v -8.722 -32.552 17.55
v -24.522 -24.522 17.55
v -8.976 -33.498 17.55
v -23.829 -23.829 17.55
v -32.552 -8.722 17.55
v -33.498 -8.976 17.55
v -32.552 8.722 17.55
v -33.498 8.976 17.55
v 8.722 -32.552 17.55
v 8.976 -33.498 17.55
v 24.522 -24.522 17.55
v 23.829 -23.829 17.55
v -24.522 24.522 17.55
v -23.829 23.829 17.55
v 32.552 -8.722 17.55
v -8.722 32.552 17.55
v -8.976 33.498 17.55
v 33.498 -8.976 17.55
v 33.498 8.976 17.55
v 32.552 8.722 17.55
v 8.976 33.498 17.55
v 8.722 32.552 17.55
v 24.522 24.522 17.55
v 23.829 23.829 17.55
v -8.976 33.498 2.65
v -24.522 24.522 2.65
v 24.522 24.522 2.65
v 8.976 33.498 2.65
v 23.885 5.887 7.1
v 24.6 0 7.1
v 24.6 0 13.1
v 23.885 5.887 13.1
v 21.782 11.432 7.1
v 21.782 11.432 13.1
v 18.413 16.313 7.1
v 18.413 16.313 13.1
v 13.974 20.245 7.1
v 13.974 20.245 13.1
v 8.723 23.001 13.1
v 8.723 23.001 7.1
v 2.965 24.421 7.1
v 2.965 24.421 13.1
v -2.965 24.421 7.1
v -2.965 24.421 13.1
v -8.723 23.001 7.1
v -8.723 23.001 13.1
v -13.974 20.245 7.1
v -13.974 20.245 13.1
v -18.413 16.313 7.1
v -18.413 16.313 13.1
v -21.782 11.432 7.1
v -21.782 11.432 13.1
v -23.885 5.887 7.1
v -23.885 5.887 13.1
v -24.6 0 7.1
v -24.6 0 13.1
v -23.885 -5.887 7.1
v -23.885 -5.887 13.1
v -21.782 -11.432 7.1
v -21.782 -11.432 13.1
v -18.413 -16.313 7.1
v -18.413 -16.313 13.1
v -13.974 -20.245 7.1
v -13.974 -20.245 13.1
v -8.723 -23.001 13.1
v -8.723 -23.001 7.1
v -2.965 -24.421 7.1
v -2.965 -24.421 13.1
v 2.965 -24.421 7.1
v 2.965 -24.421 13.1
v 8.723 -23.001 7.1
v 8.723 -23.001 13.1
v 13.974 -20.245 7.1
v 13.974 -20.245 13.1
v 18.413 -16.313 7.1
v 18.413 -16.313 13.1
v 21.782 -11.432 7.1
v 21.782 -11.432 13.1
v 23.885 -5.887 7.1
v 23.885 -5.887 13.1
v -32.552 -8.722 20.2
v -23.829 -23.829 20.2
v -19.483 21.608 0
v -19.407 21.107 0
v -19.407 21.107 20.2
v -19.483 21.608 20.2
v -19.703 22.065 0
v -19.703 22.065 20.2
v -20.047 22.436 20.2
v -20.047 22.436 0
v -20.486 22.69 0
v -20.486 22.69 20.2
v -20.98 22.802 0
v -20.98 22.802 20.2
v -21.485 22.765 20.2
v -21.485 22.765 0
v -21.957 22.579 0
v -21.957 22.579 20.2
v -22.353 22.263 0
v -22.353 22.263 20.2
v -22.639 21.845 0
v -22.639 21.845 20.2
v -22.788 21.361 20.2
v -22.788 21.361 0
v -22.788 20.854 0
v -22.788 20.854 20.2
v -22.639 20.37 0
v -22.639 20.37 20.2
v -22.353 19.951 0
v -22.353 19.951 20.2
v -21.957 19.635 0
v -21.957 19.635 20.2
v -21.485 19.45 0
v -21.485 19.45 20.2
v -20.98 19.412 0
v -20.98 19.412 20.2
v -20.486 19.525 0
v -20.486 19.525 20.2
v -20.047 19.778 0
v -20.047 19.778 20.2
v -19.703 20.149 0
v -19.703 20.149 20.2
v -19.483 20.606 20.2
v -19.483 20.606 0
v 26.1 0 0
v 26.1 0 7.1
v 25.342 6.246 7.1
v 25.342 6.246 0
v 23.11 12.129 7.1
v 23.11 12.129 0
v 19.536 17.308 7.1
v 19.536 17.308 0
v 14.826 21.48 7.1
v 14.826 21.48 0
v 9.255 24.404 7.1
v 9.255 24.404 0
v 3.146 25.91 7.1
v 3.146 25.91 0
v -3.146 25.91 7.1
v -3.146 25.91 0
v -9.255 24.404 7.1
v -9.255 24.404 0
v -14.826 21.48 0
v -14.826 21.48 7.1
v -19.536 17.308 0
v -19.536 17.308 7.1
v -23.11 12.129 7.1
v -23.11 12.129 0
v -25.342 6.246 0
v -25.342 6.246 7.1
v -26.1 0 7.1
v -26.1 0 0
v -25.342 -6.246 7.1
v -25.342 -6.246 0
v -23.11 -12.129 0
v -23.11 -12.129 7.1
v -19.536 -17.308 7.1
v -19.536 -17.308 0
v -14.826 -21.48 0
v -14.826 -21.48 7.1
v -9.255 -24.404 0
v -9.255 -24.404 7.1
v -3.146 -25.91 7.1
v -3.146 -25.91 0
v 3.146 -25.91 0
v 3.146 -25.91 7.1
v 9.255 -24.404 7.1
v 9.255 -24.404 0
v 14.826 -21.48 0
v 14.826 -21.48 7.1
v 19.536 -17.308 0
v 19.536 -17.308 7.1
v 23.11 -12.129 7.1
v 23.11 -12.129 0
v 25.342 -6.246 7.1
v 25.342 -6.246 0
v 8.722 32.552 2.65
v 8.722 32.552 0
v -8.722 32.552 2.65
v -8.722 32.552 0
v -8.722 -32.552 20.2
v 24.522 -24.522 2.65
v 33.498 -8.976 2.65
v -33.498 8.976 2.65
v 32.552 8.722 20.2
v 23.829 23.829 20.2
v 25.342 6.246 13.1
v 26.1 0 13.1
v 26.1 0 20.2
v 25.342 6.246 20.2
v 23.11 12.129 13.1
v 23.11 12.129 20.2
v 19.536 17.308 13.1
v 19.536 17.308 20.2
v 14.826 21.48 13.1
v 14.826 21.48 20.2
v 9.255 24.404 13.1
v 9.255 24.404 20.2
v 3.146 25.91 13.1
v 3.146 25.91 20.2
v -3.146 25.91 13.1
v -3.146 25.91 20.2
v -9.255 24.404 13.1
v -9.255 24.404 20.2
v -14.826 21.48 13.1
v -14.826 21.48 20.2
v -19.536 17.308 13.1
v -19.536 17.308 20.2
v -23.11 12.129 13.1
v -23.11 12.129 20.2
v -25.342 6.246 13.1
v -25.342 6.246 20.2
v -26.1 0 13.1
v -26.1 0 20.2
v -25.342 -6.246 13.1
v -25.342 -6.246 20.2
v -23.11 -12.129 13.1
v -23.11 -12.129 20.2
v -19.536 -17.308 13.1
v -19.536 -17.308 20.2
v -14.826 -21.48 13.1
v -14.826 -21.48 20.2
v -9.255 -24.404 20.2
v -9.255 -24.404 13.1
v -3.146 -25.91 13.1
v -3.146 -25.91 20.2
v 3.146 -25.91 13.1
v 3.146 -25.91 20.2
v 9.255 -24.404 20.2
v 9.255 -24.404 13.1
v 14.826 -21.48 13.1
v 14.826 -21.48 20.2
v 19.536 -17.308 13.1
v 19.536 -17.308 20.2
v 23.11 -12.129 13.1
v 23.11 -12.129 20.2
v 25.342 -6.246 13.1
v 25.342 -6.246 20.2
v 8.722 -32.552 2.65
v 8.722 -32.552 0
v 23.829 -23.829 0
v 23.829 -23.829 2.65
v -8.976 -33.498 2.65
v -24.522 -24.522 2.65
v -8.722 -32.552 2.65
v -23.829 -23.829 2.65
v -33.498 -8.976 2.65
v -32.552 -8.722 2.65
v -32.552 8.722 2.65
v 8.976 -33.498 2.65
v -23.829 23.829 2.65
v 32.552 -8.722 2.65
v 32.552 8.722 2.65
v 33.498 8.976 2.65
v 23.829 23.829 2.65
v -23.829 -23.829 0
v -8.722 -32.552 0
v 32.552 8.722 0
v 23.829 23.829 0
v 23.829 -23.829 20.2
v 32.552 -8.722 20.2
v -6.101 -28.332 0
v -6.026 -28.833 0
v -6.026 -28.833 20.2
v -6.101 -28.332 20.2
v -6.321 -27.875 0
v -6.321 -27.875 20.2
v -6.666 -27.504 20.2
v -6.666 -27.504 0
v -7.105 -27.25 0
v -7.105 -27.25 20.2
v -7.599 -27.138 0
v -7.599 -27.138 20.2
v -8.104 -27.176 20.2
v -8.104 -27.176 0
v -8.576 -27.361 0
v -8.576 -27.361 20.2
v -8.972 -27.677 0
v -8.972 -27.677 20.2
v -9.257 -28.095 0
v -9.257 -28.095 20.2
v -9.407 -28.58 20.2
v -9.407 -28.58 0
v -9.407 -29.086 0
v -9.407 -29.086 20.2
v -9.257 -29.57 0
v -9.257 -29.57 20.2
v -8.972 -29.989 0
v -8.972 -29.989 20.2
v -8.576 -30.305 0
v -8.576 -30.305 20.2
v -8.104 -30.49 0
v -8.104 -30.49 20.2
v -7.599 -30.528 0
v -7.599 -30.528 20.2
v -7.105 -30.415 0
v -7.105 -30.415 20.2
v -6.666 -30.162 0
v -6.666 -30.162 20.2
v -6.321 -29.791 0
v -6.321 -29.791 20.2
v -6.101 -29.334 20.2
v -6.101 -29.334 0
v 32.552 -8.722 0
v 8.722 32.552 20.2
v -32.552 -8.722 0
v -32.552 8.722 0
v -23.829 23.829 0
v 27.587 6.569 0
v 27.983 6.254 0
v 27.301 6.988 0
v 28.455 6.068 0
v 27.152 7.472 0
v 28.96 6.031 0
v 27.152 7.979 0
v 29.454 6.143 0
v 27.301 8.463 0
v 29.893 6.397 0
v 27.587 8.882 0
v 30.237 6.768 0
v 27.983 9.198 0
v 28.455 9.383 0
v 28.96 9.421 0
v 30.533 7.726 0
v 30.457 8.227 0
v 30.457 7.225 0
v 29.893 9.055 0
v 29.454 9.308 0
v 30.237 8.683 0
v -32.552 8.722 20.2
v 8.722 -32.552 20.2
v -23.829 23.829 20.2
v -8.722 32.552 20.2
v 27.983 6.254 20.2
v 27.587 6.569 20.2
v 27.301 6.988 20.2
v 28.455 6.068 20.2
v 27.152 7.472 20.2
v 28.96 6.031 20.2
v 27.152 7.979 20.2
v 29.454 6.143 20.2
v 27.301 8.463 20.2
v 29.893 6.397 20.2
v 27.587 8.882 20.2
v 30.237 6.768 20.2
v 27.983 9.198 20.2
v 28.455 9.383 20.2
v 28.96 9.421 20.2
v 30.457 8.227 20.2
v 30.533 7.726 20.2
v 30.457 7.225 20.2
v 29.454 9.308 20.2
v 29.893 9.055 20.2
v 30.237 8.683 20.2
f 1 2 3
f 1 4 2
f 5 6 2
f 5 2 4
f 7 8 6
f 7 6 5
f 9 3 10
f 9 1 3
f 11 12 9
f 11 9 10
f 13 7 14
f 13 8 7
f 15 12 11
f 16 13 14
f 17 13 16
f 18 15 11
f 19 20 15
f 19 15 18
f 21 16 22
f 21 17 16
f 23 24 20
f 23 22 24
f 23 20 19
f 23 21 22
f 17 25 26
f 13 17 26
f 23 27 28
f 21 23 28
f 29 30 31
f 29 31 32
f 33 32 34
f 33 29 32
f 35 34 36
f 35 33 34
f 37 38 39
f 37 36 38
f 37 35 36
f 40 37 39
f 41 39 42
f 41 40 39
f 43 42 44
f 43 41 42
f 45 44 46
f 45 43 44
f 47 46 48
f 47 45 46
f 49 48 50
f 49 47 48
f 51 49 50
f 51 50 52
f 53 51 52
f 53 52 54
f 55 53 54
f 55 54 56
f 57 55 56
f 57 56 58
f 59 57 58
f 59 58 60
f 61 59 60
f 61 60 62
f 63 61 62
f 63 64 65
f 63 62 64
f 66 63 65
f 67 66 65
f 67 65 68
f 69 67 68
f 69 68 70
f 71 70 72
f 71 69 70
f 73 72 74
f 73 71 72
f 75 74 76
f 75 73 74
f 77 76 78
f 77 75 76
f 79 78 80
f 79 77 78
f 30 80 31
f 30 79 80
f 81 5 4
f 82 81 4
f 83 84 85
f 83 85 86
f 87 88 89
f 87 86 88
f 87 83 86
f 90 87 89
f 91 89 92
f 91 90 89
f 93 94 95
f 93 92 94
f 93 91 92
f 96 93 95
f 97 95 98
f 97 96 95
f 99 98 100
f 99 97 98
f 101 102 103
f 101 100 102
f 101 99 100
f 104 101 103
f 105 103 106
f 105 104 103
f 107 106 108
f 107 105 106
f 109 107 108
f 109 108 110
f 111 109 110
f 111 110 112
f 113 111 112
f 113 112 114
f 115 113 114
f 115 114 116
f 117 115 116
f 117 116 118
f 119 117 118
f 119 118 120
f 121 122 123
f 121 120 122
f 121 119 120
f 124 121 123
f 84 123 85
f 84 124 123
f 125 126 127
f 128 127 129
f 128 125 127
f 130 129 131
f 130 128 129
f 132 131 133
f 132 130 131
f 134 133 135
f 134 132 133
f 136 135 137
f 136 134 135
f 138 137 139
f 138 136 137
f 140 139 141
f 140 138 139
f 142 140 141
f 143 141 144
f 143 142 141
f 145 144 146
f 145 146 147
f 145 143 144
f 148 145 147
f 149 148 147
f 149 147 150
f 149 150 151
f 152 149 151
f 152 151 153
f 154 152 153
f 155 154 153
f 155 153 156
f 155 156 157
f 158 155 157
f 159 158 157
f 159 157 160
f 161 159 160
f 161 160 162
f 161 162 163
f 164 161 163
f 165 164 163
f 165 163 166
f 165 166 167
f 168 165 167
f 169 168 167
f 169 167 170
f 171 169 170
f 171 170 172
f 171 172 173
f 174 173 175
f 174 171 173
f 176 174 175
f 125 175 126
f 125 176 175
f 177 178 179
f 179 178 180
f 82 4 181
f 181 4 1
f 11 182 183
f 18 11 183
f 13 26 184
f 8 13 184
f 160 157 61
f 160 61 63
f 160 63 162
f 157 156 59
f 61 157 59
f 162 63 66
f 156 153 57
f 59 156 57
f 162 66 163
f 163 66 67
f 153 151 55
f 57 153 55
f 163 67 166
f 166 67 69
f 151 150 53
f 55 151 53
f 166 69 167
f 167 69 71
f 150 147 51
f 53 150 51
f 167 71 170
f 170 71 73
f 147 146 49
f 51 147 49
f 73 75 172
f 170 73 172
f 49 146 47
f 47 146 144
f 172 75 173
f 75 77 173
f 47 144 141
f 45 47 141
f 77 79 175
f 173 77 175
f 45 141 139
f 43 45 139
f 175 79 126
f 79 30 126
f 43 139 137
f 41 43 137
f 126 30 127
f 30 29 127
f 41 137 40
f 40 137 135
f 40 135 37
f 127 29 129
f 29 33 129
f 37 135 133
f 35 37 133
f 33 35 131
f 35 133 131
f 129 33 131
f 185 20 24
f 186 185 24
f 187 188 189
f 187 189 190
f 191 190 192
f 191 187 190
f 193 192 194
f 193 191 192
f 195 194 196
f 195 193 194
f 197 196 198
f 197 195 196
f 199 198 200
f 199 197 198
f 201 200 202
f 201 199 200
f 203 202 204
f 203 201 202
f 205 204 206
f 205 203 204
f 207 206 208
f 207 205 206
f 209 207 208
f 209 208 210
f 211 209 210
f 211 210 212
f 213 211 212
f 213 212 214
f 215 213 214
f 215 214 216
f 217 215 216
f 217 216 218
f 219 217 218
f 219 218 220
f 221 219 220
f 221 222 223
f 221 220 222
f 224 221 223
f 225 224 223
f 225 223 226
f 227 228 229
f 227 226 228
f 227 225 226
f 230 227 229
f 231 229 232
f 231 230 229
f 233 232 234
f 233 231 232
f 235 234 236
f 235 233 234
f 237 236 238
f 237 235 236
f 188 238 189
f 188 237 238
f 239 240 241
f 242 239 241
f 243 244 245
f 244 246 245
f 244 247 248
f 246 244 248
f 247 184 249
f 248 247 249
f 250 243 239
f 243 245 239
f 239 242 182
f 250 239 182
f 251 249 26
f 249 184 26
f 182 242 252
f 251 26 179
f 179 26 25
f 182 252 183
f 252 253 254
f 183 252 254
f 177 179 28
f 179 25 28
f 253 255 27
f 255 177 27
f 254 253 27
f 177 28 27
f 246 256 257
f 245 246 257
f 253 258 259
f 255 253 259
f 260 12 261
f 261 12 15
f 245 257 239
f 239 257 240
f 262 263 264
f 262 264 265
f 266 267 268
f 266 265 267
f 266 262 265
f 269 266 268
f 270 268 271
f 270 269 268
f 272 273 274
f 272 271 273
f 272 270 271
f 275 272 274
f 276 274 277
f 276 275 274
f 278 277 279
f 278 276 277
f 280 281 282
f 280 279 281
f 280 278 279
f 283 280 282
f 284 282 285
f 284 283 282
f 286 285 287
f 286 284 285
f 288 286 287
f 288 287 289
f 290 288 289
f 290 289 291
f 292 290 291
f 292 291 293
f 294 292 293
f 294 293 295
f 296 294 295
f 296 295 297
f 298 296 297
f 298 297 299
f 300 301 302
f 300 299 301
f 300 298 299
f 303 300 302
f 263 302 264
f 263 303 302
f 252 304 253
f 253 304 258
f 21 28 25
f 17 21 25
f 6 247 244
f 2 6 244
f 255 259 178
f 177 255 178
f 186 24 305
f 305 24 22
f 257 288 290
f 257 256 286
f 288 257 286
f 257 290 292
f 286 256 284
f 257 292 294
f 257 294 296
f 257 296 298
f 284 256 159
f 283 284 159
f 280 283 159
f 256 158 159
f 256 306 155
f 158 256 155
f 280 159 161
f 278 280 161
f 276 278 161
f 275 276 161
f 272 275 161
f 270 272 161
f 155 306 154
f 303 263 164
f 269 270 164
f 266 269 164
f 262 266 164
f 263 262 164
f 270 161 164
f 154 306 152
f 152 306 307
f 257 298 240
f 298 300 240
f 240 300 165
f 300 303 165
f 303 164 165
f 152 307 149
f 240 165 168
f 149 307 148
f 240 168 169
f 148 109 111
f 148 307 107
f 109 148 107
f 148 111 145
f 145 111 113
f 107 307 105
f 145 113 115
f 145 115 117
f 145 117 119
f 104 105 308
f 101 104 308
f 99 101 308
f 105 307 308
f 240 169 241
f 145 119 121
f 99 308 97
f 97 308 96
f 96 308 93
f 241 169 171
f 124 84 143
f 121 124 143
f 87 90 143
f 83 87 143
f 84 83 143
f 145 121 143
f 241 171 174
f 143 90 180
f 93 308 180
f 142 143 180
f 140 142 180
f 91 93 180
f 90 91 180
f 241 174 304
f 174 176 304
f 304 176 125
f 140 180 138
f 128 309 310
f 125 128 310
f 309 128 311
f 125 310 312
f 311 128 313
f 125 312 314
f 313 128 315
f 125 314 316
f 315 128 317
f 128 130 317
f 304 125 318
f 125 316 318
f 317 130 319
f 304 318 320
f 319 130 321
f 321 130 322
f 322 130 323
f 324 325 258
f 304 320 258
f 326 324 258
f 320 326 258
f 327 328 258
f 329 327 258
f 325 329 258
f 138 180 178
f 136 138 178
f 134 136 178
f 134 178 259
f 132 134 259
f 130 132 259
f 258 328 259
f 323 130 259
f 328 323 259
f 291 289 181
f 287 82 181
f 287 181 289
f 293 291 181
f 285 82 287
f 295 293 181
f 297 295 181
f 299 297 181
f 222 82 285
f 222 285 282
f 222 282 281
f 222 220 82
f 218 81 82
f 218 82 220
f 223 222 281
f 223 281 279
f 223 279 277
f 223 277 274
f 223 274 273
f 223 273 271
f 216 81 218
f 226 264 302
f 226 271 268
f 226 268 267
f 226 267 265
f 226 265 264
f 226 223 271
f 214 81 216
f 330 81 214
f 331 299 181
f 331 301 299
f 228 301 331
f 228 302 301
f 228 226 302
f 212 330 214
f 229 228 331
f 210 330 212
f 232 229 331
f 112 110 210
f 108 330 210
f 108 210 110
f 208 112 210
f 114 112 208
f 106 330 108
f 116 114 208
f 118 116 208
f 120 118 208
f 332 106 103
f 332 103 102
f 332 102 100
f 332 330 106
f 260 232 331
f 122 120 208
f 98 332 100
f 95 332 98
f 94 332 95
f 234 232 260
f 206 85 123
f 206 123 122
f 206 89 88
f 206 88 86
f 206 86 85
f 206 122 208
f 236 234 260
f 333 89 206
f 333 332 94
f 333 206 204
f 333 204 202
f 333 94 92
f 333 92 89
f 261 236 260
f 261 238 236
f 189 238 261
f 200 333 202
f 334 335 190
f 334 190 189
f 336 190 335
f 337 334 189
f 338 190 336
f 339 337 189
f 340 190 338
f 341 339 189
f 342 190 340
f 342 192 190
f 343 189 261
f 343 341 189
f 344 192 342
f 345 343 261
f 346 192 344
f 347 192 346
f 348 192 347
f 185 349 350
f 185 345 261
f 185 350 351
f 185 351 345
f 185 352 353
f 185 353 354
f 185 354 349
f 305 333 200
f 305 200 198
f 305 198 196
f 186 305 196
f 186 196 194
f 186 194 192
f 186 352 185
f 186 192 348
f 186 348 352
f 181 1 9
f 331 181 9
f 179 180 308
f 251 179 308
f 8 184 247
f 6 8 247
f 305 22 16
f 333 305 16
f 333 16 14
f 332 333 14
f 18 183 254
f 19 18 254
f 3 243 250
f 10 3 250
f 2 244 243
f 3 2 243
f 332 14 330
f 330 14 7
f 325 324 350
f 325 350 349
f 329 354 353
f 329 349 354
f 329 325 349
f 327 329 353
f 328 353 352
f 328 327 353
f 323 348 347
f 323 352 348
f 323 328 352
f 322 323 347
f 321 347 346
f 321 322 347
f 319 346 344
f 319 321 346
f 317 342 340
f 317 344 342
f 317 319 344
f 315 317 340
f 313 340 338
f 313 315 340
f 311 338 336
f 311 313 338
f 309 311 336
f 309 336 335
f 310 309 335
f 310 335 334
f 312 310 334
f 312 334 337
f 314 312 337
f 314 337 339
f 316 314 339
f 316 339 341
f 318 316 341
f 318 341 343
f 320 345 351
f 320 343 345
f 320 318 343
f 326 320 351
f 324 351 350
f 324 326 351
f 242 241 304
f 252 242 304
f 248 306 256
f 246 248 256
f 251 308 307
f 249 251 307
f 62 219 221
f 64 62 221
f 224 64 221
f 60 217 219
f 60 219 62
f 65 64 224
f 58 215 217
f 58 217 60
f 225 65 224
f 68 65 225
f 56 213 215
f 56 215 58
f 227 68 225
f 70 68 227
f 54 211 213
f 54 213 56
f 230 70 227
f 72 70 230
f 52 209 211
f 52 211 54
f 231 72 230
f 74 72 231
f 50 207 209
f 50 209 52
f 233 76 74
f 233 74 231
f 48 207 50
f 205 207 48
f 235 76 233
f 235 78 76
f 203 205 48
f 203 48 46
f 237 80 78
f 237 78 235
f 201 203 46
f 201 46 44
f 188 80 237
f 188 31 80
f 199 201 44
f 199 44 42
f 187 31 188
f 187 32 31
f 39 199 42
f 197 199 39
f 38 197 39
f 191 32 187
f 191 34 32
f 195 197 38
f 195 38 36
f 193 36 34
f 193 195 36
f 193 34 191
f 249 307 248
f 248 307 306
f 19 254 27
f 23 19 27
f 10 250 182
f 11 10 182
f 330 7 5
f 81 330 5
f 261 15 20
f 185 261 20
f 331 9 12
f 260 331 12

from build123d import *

# Parameters (mm, degrees)
S01_SMALLER_TWELVE_FLAT_END_BEAD_SEATS_R      = 24.6
F_01_SMALLER_TWELVE_FLAT_END_BEAD_SEATS_DEPTH = 20.2
F_02_START                                    = 2.65
S02_RAISED_CENTRAL_TYRE_DRIVE_KEY_R           = 24.6
F_02_RAISED_CENTRAL_TYRE_DRIVE_KEY_DEPTH      = 14.9
F_03_START                                    = -0.1
S03_INBOARD_6808_OUTER_RACE_SEAT_R            = 26.1
F_03_INBOARD_6808_OUTER_RACE_SEAT_DEPTH       = 7.2
F_04_START                                    = 13.1
S04_OUTBOARD_6808_OUTER_RACE_SEAT_R           = 26.1
F_04_OUTBOARD_6808_OUTER_RACE_SEAT_DEPTH      = 7.2
F_05_START                                    = -0.1
S05_THREE_TYRE_FLANGE_THROUGH_HOLES_R         = 1.7
F_05_THREE_TYRE_FLANGE_THROUGH_HOLES_DEPTH    = 20.4


with BuildPart() as part:
    # S01 - Smaller twelve-flat end bead seats → 01 - Smaller twelve-flat end bead seats (new body)
    with BuildSketch(Plane.XY):
        Polygon((32.551700346, 8.72220182), (23.829498526, 23.829498526), (8.72220182, 32.551700346), (-8.72220182, 32.551700346), (-23.829498526, 23.829498526), (-32.551700346, 8.72220182), (-32.551700346, -8.72220182), (-23.829498526, -23.829498526), (-8.72220182, -32.551700346), (8.72220182, -32.551700346), (23.829498526, -23.829498526), (32.551700346, -8.72220182), align=None)
        Circle(S01_SMALLER_TWELVE_FLAT_END_BEAD_SEATS_R, mode=Mode.SUBTRACT)
    extrude(amount=F_01_SMALLER_TWELVE_FLAT_END_BEAD_SEATS_DEPTH)

    # S02 - Raised central tyre drive key → 02 - Raised central tyre drive key (add)
    with BuildSketch(Plane.XY.offset(F_02_START)):
        Polygon((33.498307656, 8.975844484), (24.522463172, 24.522463172), (8.975844484, 33.498307656), (-8.975844484, 33.498307656), (-24.522463172, 24.522463172), (-33.498307656, 8.975844484), (-33.498307656, -8.975844484), (-24.522463172, -24.522463172), (-8.975844484, -33.498307656), (8.975844484, -33.498307656), (24.522463172, -24.522463172), (33.498307656, -8.975844484), align=None)
        Circle(S02_RAISED_CENTRAL_TYRE_DRIVE_KEY_R, mode=Mode.SUBTRACT)
    extrude(amount=F_02_RAISED_CENTRAL_TYRE_DRIVE_KEY_DEPTH)

    # S03 - Inboard 6808 outer race seat → 03 - Inboard 6808 outer race seat (cut)
    with BuildSketch(Plane.XY.offset(F_03_START)):
        Circle(S03_INBOARD_6808_OUTER_RACE_SEAT_R)
    extrude(amount=F_03_INBOARD_6808_OUTER_RACE_SEAT_DEPTH, mode=Mode.SUBTRACT)

    # S04 - Outboard 6808 outer race seat → 04 - Outboard 6808 outer race seat (cut)
    with BuildSketch(Plane.XY.offset(F_04_START)):
        Circle(S04_OUTBOARD_6808_OUTER_RACE_SEAT_R)
    extrude(amount=F_04_OUTBOARD_6808_OUTER_RACE_SEAT_DEPTH, mode=Mode.SUBTRACT)

    # S05 - Three tyre-flange through holes → 05 - Three tyre-flange through holes (cut)
    with BuildSketch(Plane.XY.offset(F_05_START)):
        with Locations((28.832885915, 7.725748496)):
            Circle(S05_THREE_TYRE_FLANGE_THROUGH_HOLES_R)
        with Locations((-21.107137418, 21.107137418)):
            Circle(S05_THREE_TYRE_FLANGE_THROUGH_HOLES_R)
        with Locations((-7.725748496, -28.832885915)):
            Circle(S05_THREE_TYRE_FLANGE_THROUGH_HOLES_R)
    extrude(amount=F_05_THREE_TYRE_FLANGE_THROUGH_HOLES_DEPTH, mode=Mode.SUBTRACT)


solid = part.part
